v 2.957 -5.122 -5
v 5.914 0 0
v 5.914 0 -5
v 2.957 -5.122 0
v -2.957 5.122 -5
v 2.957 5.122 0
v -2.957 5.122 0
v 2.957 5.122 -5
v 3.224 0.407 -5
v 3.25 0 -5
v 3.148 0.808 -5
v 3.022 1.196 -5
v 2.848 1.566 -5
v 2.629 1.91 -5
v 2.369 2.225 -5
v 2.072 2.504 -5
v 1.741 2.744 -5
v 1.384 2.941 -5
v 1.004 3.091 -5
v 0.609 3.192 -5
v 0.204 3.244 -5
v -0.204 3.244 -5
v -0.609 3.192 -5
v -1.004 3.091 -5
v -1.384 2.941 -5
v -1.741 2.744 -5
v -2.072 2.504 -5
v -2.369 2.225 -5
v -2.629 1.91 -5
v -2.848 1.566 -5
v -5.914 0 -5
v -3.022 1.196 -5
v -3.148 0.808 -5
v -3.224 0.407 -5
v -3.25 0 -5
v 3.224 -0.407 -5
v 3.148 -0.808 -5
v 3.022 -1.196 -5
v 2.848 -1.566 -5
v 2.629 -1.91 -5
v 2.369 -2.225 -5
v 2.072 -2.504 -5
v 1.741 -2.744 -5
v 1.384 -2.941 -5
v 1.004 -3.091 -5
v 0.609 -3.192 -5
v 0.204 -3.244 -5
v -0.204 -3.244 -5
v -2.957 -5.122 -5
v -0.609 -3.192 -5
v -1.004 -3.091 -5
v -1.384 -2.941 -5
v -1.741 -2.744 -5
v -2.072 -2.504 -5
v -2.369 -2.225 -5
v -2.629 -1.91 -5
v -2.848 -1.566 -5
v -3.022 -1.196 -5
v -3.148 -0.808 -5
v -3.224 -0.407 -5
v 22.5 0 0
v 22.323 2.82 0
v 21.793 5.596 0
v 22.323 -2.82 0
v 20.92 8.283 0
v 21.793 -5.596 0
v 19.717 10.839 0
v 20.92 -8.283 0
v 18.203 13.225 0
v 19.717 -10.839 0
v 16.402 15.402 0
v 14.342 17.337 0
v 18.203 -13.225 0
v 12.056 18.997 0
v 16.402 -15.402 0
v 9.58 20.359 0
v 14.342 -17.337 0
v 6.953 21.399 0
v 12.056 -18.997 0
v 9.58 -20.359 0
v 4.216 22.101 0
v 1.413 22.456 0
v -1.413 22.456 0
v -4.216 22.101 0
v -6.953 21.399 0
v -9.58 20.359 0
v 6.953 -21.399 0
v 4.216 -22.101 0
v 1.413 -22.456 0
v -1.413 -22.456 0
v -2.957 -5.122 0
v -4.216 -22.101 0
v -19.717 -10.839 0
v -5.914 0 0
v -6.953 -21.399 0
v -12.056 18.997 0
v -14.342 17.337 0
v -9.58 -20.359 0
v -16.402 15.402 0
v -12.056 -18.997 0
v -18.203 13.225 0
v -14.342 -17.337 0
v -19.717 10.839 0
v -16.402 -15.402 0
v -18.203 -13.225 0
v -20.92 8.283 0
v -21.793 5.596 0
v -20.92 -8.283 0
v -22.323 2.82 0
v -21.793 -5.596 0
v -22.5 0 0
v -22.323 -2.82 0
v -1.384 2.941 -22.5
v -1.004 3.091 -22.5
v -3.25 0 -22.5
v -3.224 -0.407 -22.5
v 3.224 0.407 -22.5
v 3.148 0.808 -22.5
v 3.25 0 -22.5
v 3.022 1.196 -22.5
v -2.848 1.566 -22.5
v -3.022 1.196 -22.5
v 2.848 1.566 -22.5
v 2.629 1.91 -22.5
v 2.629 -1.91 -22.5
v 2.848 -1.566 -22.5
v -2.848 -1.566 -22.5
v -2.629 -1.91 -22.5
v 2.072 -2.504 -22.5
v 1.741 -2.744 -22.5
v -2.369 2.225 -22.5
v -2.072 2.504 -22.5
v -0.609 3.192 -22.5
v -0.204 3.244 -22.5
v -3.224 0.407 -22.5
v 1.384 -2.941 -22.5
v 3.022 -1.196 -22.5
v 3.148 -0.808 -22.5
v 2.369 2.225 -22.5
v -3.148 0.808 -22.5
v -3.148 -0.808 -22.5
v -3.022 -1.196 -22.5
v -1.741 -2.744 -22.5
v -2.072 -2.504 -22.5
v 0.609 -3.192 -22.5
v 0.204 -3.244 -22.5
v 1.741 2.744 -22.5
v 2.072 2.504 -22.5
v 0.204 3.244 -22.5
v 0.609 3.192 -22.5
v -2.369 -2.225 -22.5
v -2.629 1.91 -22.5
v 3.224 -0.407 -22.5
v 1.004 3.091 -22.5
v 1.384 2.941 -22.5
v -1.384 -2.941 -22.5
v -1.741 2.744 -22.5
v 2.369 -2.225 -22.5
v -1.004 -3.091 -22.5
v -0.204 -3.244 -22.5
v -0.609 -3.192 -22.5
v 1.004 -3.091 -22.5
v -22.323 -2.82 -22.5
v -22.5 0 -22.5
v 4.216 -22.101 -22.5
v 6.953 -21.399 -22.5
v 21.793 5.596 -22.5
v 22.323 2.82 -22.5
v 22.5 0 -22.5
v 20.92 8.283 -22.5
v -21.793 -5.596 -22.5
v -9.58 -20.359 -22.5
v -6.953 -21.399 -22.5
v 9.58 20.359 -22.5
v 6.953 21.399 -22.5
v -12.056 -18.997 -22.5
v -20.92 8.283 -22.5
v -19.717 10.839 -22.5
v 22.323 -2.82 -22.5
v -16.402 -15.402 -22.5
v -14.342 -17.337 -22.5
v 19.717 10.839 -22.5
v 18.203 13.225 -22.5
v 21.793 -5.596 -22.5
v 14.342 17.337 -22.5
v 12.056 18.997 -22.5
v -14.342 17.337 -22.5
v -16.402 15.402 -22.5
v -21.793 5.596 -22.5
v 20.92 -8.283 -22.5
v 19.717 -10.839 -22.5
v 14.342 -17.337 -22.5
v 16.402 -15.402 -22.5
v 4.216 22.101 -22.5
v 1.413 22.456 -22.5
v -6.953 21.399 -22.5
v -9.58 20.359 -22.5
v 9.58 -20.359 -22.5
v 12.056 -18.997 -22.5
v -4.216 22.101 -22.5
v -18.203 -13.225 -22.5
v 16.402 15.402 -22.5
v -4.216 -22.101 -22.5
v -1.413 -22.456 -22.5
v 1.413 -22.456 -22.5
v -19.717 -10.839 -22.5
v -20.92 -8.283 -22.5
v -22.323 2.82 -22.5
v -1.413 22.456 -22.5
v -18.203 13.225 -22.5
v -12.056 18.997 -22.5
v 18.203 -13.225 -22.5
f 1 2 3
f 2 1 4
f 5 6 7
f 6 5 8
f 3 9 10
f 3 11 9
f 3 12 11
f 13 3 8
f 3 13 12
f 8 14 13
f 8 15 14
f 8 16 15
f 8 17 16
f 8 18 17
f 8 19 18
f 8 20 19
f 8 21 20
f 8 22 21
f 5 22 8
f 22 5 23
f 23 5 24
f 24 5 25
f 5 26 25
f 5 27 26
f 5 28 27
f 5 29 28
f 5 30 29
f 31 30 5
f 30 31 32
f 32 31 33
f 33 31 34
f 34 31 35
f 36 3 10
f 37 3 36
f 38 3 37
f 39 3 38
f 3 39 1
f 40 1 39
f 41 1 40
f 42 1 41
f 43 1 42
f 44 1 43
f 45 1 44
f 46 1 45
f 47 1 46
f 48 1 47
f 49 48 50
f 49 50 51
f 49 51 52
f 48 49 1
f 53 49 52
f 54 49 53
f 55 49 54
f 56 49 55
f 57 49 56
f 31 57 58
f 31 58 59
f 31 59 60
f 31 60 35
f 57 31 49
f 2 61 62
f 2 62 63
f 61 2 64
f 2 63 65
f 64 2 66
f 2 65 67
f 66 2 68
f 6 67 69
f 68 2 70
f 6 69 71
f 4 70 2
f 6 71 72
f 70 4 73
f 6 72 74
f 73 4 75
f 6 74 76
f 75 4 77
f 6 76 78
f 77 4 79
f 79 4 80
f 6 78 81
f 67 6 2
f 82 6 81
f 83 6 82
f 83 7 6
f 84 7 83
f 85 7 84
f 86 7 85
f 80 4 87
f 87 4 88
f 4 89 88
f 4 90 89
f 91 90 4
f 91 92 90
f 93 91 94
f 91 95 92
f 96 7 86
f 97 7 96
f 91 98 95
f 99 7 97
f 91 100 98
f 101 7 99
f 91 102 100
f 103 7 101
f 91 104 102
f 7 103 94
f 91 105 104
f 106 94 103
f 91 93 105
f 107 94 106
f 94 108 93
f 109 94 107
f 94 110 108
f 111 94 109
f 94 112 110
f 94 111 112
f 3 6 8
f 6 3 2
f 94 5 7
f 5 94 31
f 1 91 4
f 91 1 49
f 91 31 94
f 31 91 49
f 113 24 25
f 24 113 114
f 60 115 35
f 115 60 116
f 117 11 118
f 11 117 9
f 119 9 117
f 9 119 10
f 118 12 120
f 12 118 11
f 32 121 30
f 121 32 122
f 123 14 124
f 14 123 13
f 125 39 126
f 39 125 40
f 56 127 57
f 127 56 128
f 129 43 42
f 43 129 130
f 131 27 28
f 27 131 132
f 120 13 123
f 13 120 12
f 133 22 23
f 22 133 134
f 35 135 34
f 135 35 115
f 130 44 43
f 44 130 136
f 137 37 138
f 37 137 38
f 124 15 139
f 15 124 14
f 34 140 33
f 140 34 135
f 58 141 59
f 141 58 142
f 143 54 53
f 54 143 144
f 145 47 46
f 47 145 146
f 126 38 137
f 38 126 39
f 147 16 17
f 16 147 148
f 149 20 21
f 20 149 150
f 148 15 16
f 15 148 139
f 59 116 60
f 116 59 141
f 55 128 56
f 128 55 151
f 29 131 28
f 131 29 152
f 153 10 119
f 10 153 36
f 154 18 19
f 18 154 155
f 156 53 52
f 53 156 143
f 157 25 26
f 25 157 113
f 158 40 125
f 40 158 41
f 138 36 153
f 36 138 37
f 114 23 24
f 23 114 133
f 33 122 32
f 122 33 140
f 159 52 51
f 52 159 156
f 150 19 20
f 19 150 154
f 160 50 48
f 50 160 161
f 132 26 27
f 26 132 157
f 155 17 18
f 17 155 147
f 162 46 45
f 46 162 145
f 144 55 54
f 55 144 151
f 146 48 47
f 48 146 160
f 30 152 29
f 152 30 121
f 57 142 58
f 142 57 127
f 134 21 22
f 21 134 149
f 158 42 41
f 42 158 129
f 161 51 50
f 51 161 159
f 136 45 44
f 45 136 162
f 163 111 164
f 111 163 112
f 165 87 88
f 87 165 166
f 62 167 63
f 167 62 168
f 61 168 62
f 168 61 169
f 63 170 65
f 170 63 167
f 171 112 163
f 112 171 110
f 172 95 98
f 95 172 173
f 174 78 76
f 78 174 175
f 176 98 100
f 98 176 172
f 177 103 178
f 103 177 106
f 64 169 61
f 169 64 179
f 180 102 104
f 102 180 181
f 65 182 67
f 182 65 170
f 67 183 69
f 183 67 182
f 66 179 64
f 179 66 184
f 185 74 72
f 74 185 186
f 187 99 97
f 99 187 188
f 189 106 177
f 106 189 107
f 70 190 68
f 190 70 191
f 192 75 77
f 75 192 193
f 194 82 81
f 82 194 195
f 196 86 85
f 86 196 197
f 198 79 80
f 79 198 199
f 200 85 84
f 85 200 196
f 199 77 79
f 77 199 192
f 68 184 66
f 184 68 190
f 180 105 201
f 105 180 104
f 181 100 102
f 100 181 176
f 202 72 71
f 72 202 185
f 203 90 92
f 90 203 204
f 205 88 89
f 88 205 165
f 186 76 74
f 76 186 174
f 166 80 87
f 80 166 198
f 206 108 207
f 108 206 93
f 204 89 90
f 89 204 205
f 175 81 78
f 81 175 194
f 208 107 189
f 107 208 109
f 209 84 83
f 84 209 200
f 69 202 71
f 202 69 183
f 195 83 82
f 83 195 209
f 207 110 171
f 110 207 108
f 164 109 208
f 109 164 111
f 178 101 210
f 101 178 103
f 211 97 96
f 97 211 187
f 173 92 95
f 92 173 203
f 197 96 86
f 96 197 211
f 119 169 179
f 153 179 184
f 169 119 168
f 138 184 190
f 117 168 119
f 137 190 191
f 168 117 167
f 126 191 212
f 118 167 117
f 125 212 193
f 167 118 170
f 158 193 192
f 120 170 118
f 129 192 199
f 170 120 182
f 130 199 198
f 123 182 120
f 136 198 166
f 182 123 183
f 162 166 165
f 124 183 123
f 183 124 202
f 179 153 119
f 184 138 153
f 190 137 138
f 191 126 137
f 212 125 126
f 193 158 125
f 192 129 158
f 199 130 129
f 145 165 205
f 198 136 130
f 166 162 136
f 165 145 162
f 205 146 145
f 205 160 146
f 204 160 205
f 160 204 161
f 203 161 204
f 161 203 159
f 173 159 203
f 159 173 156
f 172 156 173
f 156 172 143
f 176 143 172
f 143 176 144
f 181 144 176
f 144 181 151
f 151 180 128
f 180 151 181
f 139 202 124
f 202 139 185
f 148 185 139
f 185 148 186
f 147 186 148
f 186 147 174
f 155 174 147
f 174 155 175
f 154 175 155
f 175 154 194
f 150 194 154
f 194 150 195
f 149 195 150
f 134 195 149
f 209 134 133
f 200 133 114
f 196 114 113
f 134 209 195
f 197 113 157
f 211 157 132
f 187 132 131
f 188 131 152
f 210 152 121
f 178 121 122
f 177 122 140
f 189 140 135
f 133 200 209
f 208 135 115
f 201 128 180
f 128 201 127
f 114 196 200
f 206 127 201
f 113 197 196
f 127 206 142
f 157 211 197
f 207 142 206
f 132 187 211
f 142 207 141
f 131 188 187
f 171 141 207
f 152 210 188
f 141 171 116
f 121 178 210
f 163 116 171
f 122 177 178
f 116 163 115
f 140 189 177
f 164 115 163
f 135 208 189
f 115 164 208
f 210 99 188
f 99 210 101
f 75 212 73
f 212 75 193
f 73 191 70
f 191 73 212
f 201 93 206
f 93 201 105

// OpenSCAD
$fn = 50;

difference() {
	union() {
		translate(v = [0, 0, -22.5]) {
			cylinder(h = 22.5, r = 22.5);
		}
	}
	union() {
		translate(v = [0, 0, 0]) {
			rotate(a = [0, 0, 0]) {
				difference() {
					union() {
						translate(v = [0, 0, -5]) {
							linear_extrude(height = 5) {
								polygon(points = [[5.914249999999999, 0.0], [2.957125, 5.1218907443321156], [-2.9571249999999982, 5.1218907443321156], [-5.914249999999999, 7.242867331857232e-16], [-2.9571250000000022, -5.121890744332115], [2.9571249999999956, -5.121890744332118]]);
							}
						}
					}
					union();
				}
			}
		}
		#translate(v = [0, 0, -100.0]) {
			cylinder(h = 200, r = 3.25);
		}
	}
}
